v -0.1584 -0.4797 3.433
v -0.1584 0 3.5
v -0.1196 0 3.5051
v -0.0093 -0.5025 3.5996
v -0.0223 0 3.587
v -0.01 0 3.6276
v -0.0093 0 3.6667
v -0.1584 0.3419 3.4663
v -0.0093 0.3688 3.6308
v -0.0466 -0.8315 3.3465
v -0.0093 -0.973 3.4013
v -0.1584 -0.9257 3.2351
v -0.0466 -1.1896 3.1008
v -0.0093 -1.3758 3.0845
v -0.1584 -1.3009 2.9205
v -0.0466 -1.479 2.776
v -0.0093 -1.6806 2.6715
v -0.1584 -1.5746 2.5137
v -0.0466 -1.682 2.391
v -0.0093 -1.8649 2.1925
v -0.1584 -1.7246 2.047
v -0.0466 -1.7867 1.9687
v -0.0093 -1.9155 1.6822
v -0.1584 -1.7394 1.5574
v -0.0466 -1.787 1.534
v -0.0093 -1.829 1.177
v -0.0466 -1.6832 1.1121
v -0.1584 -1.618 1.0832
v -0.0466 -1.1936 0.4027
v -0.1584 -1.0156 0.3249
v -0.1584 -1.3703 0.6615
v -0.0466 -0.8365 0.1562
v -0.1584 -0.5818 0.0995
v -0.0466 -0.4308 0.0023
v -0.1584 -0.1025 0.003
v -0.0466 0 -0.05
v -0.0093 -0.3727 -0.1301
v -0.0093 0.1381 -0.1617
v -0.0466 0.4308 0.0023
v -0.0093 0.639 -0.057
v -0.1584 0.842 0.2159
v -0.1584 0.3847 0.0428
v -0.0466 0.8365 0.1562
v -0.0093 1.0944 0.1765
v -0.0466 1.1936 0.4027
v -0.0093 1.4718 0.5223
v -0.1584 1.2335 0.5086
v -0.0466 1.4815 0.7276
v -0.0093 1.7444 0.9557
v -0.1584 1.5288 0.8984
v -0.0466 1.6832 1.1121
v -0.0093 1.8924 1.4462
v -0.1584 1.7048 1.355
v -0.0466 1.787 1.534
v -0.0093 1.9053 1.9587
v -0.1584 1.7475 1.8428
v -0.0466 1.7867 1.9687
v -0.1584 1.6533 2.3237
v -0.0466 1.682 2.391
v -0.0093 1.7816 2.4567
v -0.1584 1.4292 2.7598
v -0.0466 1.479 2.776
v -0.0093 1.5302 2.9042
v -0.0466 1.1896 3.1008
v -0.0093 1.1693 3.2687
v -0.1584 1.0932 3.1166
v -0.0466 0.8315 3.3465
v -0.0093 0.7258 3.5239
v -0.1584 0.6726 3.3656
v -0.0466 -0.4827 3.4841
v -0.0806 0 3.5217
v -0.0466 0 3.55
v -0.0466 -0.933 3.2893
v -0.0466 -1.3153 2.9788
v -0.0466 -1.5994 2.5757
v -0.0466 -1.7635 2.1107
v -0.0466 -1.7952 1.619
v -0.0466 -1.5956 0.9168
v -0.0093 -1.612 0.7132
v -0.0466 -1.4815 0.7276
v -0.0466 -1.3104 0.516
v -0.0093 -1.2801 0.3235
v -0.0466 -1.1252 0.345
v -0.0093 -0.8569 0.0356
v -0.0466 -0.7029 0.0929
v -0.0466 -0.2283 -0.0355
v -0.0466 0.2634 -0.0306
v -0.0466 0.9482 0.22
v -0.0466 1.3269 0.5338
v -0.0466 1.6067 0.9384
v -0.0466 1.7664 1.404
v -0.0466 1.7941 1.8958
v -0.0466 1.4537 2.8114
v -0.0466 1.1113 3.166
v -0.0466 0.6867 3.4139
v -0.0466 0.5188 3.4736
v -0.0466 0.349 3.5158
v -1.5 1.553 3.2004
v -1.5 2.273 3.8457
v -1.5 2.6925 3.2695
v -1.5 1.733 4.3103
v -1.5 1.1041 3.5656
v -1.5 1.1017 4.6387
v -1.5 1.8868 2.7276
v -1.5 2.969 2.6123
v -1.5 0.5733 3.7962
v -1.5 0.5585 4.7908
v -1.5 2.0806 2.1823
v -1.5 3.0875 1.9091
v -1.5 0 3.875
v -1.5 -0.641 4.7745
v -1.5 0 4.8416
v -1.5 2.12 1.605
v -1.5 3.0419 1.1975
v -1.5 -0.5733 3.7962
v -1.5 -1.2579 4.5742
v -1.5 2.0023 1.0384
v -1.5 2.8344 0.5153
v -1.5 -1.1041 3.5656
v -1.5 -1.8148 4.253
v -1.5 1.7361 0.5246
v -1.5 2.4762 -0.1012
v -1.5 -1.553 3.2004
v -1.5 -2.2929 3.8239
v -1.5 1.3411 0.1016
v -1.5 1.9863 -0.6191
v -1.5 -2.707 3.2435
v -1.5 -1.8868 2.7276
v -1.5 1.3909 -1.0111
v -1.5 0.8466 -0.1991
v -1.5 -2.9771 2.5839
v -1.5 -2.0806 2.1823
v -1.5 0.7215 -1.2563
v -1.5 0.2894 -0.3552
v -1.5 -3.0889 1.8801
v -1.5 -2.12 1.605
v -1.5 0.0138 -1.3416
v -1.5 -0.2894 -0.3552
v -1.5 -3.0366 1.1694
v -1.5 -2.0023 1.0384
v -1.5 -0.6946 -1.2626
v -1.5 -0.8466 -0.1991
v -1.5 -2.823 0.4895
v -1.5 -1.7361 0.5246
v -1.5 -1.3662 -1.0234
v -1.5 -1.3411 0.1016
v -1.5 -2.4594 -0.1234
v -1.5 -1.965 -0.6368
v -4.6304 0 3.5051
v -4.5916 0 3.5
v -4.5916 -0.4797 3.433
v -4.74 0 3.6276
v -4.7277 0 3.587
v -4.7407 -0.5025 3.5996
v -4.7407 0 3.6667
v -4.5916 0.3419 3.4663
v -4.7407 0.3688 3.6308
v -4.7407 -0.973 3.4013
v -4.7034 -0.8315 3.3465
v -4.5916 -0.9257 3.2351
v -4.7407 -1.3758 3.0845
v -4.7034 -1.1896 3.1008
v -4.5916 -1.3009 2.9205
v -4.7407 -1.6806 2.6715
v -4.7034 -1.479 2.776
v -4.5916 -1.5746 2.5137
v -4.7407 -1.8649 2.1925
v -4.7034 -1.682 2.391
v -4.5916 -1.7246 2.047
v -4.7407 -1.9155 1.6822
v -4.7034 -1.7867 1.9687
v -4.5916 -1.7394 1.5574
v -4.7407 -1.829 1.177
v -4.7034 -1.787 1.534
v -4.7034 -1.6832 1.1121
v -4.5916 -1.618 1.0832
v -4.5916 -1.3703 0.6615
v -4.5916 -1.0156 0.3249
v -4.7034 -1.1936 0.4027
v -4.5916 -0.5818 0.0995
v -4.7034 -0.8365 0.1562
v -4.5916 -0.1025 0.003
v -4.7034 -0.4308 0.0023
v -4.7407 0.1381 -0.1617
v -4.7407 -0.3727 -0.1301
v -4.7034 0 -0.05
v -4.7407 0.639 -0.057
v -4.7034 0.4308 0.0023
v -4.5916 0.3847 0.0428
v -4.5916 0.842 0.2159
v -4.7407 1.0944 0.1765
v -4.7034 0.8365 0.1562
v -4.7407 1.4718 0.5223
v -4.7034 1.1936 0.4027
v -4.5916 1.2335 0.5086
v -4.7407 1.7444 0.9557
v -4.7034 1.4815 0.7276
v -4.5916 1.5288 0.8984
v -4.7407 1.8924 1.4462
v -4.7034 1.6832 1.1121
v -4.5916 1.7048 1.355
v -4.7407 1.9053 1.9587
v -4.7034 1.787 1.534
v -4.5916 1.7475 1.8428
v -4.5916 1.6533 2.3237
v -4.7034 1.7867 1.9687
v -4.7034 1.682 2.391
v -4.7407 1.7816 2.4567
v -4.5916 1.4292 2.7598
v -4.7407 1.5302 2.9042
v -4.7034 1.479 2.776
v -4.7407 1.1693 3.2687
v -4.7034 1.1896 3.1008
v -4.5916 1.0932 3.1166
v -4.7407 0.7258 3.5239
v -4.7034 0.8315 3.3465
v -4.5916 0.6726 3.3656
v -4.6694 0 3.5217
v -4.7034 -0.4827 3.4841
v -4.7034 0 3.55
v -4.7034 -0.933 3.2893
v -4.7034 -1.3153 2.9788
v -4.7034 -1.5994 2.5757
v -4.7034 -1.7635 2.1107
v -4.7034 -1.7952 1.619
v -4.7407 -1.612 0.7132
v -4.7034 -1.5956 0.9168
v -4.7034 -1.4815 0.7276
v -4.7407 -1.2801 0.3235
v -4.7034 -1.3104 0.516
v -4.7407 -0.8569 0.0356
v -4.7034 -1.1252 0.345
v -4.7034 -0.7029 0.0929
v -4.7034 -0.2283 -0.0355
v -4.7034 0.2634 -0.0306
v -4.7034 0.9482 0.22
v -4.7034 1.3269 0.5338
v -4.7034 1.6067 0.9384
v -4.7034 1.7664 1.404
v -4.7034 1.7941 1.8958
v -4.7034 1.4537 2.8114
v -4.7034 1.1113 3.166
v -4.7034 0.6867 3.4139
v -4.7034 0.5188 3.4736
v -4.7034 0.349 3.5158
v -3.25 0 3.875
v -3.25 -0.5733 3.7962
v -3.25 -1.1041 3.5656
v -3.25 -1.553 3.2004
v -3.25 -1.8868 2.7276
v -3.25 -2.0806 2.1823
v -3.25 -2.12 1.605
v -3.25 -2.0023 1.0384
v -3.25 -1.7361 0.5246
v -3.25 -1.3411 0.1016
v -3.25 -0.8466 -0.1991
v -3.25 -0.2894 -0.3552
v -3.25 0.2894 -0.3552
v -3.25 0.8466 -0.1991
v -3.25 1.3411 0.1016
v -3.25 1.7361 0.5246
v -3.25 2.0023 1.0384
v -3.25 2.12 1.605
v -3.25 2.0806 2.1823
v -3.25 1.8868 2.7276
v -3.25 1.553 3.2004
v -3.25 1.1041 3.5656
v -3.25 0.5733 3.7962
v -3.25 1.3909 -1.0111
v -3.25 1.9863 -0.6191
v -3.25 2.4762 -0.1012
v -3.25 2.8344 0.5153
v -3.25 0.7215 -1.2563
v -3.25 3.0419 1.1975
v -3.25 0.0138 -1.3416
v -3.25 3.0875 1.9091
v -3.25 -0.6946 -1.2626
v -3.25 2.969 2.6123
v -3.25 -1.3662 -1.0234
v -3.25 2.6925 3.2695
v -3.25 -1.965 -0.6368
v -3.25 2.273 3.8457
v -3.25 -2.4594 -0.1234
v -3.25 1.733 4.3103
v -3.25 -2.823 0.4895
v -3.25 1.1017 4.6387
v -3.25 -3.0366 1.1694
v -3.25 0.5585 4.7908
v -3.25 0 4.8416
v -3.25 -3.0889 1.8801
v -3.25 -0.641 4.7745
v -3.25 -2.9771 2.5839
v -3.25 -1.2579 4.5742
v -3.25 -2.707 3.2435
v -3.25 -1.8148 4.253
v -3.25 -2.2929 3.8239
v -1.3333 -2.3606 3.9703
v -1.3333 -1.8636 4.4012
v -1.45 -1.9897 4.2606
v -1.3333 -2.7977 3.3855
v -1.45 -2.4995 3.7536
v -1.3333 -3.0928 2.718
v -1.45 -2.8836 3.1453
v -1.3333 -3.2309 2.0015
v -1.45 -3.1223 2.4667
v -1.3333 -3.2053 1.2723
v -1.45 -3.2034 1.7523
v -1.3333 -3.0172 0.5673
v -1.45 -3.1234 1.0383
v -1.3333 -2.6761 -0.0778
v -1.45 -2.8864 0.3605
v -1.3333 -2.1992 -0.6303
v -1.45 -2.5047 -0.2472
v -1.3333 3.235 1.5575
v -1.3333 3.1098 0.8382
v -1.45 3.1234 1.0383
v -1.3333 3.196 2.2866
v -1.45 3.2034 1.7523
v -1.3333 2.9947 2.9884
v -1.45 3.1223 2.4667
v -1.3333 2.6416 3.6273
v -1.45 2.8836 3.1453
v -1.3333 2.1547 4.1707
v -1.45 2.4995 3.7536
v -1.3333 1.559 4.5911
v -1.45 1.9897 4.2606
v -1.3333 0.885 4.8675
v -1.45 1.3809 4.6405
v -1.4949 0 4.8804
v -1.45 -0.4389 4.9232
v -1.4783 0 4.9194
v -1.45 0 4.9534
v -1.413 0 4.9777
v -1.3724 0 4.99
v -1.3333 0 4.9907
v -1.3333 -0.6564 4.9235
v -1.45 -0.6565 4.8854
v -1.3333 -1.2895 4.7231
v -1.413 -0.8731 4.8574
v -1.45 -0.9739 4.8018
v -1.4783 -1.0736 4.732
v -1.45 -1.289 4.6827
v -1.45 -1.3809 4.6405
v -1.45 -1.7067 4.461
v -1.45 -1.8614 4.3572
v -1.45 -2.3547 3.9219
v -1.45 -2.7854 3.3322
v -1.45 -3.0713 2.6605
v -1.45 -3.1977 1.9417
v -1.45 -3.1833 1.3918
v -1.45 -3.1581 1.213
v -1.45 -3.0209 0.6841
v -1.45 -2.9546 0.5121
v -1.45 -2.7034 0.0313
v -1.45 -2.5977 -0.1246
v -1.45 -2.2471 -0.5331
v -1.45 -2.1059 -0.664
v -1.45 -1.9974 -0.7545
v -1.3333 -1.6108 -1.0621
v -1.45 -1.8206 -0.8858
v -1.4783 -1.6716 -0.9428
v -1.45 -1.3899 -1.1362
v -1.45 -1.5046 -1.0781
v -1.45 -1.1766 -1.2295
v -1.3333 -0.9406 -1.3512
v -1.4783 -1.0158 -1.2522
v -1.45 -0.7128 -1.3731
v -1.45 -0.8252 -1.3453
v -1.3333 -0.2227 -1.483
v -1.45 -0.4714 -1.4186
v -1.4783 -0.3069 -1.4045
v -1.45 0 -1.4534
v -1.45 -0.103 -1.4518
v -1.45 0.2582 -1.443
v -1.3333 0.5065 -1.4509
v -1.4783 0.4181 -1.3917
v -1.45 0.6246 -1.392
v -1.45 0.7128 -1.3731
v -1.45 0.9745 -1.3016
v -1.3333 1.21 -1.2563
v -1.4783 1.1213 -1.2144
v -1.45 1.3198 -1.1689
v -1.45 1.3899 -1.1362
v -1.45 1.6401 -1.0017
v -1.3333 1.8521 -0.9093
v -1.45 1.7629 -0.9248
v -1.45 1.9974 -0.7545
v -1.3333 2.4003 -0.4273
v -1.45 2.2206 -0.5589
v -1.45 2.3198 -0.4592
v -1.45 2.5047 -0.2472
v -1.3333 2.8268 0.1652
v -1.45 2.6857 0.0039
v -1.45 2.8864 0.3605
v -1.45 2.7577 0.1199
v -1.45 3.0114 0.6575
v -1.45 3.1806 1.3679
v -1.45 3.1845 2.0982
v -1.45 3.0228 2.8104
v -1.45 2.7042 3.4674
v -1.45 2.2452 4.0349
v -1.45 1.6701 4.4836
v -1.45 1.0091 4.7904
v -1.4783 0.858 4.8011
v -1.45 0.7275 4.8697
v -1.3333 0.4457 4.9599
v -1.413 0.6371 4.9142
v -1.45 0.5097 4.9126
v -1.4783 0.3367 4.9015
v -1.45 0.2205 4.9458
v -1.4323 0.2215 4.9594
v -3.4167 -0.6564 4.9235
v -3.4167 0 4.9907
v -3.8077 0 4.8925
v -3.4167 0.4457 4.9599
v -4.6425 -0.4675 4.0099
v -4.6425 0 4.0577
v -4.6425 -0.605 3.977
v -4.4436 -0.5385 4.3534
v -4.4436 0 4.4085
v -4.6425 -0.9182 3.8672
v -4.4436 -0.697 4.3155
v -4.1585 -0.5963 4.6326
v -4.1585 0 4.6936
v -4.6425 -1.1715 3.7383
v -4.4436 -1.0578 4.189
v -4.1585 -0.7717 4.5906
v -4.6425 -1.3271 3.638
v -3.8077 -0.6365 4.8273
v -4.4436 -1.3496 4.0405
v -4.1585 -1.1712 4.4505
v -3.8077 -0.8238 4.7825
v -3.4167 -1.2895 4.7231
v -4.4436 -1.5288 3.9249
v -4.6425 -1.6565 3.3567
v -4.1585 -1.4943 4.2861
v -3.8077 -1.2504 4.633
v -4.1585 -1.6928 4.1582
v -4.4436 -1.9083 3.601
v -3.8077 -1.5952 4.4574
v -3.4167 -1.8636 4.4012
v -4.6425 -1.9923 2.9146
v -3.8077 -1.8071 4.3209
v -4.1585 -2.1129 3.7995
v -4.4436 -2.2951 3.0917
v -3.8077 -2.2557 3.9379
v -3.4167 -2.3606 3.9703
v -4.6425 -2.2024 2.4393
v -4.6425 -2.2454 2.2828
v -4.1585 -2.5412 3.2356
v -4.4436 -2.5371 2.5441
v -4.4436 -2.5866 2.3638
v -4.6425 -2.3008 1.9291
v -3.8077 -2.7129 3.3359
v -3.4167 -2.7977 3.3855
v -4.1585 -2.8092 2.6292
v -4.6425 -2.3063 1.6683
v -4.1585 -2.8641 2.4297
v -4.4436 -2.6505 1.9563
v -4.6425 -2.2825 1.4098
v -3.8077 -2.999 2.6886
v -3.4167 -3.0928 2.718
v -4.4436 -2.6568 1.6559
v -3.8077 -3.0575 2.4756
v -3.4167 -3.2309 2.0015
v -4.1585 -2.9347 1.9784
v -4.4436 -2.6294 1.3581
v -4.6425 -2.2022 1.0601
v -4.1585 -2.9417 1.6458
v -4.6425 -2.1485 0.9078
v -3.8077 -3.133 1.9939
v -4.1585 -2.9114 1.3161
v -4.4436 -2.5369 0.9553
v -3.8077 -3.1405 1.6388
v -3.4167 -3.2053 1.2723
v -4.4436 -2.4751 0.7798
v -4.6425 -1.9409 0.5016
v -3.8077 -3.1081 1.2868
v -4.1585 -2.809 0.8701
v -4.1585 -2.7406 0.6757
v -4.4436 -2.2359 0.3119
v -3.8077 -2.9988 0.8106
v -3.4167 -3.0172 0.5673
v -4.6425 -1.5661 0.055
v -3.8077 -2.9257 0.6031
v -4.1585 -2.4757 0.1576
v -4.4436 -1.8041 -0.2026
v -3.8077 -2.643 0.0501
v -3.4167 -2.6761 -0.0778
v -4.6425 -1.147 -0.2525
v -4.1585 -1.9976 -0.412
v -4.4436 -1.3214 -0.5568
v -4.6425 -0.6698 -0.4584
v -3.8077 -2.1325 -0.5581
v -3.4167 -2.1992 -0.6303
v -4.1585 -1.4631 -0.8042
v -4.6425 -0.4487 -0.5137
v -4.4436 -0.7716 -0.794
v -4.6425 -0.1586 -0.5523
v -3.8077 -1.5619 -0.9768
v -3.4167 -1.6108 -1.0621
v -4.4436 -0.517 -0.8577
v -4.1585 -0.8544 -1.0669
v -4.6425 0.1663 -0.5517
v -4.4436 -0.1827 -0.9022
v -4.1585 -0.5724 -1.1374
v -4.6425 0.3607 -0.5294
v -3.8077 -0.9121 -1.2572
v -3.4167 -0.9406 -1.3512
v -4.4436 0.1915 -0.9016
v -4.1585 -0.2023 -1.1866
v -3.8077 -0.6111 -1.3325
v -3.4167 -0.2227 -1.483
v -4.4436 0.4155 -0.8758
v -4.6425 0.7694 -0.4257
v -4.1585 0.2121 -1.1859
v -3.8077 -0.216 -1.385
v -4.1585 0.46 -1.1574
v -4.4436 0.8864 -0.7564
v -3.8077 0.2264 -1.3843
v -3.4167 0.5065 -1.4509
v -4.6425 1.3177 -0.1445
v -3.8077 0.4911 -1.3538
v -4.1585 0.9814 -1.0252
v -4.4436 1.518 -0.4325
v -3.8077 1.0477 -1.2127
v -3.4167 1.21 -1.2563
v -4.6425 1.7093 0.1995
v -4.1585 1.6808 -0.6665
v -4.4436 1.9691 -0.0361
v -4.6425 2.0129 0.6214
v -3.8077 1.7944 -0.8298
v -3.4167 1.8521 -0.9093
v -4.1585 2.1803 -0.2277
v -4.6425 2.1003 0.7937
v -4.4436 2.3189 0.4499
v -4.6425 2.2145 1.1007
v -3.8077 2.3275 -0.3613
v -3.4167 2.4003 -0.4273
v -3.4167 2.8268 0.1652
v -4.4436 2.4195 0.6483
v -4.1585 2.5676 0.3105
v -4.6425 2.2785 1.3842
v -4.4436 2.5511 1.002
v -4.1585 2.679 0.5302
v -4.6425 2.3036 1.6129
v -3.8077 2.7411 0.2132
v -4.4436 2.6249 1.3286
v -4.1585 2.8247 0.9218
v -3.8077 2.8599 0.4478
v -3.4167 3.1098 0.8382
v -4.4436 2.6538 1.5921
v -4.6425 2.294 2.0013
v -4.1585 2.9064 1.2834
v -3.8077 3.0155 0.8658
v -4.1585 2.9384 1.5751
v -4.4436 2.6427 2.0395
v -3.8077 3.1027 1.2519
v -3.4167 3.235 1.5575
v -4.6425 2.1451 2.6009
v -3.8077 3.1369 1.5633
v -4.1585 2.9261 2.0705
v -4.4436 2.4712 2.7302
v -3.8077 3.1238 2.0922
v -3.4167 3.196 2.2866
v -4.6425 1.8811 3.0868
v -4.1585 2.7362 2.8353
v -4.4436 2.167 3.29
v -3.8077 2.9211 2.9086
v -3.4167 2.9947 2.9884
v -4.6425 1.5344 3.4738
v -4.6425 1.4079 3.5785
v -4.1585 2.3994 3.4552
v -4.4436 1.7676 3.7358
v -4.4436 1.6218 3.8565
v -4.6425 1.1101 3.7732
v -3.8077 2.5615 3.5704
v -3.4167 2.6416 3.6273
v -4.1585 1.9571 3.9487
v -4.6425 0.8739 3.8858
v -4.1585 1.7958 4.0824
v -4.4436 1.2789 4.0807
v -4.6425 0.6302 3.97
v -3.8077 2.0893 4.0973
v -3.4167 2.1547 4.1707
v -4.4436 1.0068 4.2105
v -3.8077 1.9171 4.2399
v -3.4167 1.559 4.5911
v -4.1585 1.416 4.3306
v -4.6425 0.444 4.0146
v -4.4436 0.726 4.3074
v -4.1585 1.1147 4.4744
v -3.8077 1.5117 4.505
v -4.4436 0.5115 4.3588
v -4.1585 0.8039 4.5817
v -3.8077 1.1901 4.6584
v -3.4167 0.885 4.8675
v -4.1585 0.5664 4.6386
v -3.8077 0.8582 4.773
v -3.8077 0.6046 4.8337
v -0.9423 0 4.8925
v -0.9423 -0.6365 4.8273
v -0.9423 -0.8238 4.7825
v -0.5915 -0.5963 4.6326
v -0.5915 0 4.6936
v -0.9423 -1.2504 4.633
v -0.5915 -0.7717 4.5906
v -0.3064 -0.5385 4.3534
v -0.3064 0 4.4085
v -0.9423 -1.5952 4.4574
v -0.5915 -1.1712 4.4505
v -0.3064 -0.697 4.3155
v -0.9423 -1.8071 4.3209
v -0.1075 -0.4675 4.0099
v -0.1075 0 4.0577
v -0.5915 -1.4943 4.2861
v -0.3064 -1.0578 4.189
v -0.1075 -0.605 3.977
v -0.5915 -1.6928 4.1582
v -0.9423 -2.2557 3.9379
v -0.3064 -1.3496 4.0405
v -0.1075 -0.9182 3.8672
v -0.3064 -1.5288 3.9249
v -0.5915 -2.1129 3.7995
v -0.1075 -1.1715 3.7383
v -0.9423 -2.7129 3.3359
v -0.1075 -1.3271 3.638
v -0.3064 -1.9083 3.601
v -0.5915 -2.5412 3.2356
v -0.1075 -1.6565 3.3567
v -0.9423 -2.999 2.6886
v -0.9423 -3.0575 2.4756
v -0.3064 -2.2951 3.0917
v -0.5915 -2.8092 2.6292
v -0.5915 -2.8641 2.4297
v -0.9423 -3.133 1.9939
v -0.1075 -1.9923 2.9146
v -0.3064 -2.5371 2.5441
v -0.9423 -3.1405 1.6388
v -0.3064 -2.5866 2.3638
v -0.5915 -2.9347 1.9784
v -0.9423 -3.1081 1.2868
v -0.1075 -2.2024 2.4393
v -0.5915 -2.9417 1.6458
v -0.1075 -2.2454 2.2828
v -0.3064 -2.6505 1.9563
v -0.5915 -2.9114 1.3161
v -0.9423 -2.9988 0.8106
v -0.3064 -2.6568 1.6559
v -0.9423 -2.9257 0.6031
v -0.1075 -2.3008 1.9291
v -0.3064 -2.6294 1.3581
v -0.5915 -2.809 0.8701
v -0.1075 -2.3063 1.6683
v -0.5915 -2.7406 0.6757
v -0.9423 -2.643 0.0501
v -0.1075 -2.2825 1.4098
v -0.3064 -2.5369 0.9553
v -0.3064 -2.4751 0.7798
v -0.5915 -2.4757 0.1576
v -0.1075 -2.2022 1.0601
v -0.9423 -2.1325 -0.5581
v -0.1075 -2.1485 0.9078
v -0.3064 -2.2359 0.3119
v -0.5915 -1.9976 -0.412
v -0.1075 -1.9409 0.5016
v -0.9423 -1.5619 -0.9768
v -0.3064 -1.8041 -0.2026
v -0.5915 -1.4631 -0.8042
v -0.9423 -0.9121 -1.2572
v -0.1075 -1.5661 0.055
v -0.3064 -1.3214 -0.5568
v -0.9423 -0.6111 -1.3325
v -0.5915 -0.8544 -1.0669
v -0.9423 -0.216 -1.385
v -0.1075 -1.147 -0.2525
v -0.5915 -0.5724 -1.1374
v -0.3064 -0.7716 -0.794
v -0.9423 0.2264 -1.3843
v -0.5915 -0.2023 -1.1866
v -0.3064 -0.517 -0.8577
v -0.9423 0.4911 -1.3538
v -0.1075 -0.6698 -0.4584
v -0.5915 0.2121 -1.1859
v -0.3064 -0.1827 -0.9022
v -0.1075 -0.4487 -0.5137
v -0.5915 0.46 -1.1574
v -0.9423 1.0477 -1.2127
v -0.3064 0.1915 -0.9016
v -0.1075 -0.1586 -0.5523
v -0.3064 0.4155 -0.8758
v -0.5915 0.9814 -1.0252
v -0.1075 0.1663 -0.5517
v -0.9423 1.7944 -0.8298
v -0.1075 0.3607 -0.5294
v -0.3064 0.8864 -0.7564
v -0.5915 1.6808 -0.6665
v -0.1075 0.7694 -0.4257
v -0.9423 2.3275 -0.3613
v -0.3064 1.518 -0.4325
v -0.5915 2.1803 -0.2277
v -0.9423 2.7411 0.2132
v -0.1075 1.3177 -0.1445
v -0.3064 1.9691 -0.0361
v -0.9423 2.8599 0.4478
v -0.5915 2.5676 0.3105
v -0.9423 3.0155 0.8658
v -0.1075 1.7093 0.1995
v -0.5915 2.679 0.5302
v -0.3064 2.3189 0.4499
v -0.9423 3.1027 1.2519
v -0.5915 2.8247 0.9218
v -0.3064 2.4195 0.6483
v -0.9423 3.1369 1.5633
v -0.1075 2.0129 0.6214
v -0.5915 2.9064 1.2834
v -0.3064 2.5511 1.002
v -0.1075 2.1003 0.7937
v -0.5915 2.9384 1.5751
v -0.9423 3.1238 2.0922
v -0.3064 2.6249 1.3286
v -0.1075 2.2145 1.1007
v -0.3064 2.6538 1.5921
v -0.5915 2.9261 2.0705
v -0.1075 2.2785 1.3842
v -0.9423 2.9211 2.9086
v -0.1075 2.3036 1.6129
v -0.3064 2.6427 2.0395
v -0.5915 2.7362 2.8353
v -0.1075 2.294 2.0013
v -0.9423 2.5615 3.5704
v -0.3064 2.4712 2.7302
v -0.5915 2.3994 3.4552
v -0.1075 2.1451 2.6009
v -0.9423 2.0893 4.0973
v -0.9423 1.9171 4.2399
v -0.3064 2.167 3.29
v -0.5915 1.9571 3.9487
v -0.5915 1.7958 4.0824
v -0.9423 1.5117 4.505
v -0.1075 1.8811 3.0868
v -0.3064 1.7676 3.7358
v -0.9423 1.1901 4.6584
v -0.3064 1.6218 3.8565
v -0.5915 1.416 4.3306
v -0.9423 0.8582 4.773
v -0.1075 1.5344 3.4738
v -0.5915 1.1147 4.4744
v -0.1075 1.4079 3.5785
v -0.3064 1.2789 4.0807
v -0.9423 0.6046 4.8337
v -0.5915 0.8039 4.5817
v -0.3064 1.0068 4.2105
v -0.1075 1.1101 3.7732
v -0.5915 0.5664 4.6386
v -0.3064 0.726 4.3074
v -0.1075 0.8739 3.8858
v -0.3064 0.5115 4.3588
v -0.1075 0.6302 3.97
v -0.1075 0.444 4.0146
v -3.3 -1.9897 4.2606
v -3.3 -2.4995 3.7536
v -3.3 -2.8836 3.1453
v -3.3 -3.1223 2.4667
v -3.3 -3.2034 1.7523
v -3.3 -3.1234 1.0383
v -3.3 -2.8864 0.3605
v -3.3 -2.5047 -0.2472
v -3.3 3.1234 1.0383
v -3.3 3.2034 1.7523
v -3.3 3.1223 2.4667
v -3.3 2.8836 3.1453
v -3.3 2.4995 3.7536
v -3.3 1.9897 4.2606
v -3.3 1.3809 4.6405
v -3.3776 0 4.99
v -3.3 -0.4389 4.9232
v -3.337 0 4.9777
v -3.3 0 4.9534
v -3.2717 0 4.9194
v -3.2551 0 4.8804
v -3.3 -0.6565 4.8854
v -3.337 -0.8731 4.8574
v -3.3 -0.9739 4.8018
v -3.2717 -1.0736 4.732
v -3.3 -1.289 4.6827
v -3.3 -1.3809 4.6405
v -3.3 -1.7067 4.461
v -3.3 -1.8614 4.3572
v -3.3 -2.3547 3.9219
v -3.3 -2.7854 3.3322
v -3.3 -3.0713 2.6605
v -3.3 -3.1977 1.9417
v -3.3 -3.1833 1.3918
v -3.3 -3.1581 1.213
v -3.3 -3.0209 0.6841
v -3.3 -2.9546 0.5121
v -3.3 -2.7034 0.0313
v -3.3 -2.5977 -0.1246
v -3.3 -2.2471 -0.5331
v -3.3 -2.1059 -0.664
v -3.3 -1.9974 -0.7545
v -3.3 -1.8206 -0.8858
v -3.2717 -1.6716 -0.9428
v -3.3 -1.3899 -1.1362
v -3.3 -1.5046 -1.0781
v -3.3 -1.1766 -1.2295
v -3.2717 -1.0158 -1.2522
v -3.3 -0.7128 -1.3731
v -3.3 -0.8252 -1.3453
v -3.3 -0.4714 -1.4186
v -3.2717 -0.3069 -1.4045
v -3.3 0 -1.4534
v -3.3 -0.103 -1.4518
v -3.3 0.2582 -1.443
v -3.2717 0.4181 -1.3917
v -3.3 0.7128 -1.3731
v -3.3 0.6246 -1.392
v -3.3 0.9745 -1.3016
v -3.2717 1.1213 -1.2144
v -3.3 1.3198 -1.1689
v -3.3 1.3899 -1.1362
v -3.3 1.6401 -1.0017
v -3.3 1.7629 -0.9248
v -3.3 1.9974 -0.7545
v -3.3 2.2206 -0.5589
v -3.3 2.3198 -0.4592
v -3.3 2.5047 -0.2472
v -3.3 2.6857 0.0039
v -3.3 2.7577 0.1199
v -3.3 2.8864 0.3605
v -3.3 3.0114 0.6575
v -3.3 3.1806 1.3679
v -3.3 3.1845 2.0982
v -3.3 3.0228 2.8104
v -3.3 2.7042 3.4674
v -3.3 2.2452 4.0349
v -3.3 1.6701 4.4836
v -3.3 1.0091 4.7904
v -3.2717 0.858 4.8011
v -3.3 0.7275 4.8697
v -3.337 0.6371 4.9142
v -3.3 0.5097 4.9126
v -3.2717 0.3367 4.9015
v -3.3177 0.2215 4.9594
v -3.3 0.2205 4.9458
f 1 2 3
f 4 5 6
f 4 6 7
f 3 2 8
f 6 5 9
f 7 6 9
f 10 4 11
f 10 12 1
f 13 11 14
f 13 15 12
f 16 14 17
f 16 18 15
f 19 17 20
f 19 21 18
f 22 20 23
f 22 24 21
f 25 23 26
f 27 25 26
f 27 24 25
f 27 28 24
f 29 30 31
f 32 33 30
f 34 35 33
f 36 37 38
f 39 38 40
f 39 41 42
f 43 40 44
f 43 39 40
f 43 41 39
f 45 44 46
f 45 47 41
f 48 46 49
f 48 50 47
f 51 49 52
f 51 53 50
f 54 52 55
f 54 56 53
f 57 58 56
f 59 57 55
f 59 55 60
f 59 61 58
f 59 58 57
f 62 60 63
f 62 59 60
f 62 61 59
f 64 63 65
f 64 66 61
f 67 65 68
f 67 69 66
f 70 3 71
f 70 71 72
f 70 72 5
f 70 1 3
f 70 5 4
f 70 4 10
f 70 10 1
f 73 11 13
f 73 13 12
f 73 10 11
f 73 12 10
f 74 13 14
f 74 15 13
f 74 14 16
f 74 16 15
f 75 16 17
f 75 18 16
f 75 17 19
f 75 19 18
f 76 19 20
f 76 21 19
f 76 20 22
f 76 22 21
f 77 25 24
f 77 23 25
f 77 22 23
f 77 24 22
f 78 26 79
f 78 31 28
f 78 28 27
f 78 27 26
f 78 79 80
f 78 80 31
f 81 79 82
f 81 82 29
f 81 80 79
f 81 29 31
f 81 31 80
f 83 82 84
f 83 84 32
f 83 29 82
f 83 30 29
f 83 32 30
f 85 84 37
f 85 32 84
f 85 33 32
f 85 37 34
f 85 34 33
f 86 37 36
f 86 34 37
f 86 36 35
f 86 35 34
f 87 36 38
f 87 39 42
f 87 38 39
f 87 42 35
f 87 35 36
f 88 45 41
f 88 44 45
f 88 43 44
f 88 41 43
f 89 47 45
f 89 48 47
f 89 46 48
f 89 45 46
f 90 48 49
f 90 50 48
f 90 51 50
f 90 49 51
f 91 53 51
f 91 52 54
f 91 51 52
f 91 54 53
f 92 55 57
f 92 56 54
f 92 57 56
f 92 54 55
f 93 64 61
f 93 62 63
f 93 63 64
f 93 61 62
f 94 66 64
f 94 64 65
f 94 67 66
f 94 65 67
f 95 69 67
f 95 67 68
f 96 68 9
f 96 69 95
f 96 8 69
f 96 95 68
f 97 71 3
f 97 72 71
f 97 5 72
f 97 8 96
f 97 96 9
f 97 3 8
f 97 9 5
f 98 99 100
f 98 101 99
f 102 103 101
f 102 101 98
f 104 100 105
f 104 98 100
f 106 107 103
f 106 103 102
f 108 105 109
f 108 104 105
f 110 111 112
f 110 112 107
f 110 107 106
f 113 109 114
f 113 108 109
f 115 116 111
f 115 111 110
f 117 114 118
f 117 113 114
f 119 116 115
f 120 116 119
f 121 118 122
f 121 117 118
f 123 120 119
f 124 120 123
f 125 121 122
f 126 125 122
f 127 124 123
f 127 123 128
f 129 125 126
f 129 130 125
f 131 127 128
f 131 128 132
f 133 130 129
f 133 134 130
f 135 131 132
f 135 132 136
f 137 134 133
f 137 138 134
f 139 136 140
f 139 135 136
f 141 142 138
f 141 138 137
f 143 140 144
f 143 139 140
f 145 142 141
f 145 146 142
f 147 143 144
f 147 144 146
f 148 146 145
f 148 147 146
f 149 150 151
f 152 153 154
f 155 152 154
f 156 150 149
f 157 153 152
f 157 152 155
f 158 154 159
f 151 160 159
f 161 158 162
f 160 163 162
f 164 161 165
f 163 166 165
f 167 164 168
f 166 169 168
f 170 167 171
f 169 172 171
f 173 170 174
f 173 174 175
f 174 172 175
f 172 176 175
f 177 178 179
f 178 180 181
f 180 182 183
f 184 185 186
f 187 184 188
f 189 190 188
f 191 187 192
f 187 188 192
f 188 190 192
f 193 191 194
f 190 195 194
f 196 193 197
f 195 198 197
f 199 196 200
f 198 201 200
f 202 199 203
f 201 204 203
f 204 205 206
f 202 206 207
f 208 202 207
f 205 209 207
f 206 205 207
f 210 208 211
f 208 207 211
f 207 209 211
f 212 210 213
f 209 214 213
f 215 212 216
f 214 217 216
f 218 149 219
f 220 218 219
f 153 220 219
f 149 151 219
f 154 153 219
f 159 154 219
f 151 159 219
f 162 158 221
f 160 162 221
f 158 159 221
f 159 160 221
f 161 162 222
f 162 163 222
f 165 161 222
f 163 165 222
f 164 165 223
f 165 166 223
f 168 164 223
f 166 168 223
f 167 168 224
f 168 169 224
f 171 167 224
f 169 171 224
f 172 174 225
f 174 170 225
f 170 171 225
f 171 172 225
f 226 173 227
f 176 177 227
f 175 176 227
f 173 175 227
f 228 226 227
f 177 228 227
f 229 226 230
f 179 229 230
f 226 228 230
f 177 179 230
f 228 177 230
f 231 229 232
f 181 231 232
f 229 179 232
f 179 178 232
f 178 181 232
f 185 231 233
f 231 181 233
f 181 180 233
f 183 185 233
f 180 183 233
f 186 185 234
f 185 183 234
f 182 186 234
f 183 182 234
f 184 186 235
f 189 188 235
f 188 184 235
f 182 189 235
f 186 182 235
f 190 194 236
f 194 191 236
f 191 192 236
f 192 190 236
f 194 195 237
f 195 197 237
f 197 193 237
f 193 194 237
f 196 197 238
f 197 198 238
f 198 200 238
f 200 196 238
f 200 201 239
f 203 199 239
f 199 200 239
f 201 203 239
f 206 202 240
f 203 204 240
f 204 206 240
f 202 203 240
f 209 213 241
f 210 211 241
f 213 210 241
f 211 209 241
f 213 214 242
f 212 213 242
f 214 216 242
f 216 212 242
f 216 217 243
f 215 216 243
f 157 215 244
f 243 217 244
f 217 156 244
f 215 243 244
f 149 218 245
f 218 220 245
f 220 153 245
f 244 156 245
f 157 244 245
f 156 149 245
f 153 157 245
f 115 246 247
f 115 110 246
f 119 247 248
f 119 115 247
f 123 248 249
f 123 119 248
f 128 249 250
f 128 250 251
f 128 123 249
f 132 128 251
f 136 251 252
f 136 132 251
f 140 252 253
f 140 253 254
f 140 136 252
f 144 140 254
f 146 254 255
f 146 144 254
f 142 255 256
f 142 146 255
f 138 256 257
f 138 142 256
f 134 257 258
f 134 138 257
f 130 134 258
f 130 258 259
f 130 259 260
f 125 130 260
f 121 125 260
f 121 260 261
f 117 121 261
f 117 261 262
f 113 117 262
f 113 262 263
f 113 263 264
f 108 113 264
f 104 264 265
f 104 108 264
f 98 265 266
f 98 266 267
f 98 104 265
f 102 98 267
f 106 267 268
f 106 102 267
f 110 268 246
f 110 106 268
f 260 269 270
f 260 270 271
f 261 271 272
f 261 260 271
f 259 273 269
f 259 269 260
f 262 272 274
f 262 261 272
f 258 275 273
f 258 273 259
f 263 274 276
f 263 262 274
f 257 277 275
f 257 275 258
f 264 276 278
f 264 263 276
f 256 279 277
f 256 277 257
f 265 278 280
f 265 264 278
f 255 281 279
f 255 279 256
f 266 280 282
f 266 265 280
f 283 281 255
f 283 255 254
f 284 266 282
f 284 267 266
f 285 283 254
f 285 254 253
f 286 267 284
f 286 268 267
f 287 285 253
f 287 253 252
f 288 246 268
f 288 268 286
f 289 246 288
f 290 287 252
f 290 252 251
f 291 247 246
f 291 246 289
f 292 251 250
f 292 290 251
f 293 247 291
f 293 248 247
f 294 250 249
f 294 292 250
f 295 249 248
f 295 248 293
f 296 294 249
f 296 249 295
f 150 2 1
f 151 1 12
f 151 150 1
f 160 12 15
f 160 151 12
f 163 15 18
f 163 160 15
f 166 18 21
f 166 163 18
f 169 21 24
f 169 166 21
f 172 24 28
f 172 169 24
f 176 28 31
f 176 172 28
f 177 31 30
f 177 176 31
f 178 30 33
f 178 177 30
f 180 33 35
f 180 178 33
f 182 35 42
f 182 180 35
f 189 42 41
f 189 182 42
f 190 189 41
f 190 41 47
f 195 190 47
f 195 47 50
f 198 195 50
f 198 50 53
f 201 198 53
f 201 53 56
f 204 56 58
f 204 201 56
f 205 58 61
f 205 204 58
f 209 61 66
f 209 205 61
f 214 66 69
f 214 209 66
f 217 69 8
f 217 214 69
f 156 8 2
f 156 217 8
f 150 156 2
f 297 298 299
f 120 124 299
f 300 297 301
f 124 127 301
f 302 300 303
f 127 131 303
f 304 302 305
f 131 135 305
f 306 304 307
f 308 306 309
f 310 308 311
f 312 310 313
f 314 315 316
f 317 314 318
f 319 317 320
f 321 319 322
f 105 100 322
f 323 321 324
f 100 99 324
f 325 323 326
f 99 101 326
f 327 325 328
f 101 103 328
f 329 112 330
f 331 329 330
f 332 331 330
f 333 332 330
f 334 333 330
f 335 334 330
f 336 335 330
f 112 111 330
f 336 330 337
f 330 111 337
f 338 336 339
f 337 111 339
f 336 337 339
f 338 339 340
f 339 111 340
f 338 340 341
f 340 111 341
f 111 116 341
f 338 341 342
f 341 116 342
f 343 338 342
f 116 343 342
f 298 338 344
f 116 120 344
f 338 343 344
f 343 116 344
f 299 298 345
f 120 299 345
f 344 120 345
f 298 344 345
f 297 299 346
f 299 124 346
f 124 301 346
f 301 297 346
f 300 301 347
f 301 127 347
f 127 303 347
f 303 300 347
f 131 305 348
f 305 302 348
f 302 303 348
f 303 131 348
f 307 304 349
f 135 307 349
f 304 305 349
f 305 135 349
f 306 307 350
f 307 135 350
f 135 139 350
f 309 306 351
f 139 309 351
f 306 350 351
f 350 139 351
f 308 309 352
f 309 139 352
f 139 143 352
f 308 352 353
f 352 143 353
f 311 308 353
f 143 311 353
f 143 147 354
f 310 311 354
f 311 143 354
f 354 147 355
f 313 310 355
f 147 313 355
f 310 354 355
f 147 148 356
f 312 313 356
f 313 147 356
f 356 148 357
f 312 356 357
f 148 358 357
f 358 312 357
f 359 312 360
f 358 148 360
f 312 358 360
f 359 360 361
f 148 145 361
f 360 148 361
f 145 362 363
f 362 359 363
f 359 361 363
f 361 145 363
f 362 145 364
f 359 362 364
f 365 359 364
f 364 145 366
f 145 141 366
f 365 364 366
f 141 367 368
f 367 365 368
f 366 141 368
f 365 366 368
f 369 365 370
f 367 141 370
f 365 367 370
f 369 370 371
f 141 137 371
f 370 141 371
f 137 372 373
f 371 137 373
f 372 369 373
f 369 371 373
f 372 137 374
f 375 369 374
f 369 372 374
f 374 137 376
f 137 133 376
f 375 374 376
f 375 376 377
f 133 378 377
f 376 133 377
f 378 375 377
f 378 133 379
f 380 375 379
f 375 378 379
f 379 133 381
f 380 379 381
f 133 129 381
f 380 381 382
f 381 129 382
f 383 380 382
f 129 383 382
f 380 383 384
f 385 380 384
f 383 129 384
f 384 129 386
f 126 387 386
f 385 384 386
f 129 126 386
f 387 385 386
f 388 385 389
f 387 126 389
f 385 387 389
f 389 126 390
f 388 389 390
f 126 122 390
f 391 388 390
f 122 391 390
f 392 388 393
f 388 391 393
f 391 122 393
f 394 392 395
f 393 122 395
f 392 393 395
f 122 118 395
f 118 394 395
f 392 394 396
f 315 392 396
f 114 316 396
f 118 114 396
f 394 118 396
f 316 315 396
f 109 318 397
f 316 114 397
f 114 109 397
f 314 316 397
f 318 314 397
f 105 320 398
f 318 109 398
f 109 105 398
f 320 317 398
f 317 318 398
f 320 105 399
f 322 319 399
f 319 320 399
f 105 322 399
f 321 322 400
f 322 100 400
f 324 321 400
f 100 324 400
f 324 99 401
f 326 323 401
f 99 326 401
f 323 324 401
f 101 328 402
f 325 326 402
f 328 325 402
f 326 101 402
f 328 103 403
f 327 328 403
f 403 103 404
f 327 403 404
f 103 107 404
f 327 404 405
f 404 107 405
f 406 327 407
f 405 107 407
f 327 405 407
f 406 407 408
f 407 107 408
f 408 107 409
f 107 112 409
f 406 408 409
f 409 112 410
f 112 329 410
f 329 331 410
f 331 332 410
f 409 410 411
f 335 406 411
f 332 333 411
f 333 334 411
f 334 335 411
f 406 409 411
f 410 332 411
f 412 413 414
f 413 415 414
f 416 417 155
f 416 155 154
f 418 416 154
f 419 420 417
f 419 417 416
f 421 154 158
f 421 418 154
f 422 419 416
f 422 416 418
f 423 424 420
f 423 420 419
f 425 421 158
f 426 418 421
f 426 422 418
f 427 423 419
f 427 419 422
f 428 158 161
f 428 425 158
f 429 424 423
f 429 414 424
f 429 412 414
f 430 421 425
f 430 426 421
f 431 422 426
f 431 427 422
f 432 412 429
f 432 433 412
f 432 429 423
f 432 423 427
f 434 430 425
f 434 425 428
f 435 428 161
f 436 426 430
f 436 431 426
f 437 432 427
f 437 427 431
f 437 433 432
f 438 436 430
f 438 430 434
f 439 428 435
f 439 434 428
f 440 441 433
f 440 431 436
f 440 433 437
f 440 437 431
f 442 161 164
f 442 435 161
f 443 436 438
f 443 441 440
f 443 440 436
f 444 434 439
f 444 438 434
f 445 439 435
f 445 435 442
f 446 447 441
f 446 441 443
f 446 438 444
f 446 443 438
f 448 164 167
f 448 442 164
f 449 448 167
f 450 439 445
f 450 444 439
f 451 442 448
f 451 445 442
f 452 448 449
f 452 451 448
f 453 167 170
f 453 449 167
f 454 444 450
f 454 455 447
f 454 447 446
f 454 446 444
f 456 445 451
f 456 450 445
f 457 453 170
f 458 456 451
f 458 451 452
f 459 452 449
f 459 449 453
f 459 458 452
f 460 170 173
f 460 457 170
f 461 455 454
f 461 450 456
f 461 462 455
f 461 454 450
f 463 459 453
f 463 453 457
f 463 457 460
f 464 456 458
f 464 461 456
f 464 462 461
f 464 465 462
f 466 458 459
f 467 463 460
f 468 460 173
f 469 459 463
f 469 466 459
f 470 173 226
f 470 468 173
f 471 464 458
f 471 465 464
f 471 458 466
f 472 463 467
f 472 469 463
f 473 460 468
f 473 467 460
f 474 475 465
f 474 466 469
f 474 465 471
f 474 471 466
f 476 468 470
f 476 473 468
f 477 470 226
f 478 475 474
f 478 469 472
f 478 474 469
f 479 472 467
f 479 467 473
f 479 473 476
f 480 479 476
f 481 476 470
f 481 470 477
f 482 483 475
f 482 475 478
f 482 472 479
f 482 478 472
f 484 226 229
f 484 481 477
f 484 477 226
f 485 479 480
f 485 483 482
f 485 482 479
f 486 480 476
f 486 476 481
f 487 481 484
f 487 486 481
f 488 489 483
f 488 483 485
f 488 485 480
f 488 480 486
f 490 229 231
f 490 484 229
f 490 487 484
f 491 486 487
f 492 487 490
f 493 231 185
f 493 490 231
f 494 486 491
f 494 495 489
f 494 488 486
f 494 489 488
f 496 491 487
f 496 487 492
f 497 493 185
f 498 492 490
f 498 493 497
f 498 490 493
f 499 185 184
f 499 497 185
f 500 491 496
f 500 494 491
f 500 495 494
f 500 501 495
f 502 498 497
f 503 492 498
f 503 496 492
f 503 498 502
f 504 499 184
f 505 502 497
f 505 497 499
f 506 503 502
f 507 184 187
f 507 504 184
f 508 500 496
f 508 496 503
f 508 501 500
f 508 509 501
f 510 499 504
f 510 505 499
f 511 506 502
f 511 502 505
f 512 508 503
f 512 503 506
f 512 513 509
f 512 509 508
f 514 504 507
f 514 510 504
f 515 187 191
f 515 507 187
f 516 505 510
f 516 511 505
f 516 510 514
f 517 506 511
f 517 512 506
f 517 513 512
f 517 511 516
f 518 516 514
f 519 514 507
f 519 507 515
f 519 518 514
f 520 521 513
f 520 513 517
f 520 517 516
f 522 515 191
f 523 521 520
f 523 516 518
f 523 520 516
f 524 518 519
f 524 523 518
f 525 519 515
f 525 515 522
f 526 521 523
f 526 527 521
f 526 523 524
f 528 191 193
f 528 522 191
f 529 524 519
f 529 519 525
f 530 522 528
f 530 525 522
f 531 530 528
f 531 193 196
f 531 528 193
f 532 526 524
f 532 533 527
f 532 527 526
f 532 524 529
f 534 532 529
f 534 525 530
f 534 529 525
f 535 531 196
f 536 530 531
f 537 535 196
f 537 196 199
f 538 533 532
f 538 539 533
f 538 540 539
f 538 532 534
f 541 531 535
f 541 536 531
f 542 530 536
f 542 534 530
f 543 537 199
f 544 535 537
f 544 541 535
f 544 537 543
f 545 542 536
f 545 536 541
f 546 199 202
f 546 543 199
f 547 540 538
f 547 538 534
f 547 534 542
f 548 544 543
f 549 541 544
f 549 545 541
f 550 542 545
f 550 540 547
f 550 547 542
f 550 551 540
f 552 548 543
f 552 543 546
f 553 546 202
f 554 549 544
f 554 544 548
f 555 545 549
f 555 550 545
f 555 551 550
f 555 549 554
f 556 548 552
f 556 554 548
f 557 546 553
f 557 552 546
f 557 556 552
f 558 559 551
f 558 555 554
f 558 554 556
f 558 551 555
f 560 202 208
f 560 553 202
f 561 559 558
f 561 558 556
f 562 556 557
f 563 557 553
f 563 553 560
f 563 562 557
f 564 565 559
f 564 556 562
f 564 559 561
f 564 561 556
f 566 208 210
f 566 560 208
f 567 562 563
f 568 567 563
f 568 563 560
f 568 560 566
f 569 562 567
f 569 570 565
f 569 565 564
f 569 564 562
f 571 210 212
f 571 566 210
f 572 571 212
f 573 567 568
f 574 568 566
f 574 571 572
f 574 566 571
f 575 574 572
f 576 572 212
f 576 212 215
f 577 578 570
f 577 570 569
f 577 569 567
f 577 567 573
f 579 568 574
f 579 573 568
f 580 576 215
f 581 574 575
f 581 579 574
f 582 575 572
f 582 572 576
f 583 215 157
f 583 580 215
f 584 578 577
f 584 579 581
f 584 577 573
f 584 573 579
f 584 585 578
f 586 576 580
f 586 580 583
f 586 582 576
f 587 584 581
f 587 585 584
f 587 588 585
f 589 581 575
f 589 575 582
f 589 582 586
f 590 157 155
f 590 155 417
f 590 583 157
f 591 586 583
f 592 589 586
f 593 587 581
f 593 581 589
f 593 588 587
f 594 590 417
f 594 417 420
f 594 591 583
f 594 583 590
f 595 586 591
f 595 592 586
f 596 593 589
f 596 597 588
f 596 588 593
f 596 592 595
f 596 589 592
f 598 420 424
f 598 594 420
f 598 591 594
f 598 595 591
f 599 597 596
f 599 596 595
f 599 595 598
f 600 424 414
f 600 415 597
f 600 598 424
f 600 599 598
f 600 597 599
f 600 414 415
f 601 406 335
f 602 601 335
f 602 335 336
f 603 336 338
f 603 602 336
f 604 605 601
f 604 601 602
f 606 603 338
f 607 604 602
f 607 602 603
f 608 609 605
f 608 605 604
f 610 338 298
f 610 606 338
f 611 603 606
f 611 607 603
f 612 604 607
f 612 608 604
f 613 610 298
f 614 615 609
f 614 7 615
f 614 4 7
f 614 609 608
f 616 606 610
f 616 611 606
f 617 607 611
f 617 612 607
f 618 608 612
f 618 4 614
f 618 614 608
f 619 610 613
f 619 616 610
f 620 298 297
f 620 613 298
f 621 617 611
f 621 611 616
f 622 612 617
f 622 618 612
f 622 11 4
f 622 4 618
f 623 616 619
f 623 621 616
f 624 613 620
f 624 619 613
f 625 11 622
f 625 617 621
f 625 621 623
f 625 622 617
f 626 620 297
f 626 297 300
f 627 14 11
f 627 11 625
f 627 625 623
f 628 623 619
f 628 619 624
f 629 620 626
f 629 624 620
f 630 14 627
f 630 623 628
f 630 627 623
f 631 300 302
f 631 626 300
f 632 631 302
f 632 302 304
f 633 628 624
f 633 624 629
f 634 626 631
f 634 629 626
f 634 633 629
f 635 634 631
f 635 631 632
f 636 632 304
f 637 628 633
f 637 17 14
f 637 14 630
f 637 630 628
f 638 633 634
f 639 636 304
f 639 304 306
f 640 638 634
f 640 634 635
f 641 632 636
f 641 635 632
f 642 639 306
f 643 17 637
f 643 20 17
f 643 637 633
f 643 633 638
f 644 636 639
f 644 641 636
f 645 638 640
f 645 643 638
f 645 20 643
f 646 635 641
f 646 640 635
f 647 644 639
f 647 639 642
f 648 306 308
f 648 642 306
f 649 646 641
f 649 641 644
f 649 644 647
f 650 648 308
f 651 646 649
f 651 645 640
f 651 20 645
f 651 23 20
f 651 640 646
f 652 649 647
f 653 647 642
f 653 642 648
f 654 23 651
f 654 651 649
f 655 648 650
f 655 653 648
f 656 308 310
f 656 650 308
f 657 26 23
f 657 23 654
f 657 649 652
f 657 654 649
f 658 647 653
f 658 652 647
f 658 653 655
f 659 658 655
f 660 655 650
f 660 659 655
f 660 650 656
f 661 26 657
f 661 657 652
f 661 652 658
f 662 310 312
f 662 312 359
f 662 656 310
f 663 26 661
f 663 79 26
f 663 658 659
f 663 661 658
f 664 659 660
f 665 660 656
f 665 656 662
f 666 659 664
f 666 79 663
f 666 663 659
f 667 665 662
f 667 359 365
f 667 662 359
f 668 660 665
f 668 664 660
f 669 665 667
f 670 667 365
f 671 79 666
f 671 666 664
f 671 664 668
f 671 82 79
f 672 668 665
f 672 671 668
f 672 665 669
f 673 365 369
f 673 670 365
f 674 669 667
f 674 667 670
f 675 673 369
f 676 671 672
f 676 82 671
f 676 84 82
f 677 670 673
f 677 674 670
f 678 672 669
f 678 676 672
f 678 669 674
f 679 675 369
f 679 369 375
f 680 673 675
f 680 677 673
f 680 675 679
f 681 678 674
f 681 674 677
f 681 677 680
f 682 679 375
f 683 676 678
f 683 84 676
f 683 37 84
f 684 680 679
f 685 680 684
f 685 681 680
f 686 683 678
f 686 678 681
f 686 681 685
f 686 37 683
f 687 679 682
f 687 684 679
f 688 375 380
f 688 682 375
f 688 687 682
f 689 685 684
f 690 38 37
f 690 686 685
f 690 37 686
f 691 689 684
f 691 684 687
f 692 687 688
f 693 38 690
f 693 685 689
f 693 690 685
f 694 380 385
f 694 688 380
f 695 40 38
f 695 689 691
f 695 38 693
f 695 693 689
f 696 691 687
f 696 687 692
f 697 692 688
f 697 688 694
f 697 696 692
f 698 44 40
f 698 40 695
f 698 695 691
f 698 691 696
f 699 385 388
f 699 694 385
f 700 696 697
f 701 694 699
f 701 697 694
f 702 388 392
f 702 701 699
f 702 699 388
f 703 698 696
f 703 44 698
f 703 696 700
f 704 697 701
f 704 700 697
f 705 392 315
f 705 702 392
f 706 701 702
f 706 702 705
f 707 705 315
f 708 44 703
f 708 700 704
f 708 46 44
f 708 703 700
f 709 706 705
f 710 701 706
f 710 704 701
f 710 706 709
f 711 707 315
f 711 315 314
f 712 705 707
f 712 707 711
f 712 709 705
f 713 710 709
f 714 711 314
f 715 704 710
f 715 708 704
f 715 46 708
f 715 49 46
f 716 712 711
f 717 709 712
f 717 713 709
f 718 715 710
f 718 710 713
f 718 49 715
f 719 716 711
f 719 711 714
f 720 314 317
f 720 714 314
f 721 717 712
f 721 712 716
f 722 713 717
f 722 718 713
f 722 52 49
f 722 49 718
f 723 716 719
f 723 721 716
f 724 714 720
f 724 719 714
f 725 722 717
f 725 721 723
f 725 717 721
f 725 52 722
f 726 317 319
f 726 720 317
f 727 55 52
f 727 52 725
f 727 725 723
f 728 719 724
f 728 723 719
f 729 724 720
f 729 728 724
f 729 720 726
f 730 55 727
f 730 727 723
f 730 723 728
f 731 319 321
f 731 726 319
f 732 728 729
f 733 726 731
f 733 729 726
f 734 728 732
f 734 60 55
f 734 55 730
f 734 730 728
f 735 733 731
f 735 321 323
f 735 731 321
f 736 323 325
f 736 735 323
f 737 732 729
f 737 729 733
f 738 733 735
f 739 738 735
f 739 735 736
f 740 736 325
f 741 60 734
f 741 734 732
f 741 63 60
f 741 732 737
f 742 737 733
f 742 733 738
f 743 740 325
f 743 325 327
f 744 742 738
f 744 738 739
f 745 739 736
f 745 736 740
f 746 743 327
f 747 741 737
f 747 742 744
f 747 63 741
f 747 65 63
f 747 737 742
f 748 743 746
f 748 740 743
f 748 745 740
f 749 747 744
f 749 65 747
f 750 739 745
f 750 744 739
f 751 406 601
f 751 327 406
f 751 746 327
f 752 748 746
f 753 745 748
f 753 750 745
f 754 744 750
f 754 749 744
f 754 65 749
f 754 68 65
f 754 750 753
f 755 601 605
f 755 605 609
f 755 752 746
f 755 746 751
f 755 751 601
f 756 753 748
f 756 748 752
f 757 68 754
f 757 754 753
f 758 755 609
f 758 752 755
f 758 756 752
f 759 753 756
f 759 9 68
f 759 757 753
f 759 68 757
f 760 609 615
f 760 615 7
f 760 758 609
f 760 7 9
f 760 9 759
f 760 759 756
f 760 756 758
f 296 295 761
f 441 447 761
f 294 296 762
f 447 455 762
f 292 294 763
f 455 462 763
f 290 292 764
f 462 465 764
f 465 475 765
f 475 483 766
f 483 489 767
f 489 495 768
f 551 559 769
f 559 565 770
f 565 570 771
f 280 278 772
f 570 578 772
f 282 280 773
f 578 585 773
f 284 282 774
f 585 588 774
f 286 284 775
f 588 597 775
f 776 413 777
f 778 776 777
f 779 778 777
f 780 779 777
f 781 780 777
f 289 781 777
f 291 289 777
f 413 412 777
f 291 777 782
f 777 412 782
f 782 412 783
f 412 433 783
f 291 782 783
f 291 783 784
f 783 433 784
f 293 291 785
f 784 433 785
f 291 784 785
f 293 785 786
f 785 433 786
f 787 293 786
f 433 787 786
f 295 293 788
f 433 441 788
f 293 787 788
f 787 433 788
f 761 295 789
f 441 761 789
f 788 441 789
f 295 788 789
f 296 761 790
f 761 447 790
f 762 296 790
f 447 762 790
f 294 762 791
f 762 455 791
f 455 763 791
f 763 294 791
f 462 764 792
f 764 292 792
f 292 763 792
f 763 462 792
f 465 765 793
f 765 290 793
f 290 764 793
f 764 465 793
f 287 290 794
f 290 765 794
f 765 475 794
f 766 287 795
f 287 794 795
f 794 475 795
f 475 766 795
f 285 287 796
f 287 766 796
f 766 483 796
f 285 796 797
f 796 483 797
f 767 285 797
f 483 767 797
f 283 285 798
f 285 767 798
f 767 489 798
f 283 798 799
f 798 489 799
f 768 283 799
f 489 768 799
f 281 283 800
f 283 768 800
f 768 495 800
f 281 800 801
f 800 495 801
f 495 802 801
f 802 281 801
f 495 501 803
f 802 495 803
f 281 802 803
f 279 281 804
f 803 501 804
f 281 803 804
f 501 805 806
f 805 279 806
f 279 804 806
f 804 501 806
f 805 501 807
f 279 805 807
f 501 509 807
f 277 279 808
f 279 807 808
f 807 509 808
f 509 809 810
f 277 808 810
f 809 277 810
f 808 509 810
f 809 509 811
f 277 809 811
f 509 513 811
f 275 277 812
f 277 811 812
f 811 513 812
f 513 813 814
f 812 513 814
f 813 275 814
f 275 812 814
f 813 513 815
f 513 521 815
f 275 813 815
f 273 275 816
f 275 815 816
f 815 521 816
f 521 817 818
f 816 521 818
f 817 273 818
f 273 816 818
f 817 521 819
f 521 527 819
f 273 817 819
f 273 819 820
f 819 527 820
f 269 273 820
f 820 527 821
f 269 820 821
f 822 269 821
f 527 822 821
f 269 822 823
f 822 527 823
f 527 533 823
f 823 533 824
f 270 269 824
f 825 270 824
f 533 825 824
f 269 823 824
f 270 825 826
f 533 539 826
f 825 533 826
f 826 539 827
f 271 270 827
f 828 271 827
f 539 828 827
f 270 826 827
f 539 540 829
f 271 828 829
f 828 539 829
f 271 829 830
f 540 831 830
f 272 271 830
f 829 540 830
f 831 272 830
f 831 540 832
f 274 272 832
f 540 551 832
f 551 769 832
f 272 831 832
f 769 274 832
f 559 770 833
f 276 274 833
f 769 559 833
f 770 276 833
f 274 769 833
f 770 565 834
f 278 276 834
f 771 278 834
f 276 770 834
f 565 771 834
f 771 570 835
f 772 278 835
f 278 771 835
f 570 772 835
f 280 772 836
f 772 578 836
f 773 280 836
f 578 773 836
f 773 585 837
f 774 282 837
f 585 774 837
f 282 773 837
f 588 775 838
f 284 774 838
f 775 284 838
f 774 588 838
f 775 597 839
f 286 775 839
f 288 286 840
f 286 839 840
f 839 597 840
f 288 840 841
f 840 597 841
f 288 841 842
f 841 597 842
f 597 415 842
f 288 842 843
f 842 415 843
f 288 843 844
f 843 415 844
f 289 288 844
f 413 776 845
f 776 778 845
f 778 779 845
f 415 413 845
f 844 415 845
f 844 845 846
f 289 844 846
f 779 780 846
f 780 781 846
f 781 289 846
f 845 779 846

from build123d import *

# Parameters (mm, degrees)
FILLET1_R = 0.15


with BuildPart() as part:
    # Sketch2 → Revolve1 (revolve)
    with BuildSketch(Plane(origin=(0, 0, 0), x_dir=(1, 0, 0), z_dir=(0, 1, 0)), mode=Mode.PRIVATE) as revolve1_sk:
        with BuildLine():
            Line((0, 0), (-4.75, 0))
            ThreePointArc((-4.75, 0), (-4.310660172, 1.060660172), (-3.25, 1.5))
            Line((-3.25, 1.5), (-3.25, 0.375))
            Line((-3.25, 0.375), (-1.5, 0.375))
            Line((-1.5, 0.375), (-1.5, 1.5))
            ThreePointArc((-1.5, 1.5), (-0.439339828, 1.060660172), (0, 0))
        make_face()
    revolve(revolve1_sk.sketch.rotate(Axis((-6.635988873, 0, 1.75), (1, 0, 0)), 180), axis=Axis((-6.635988873, 0, 1.75), (1, 0, 0)))

    # Fillet1
    fillet1_edges = [part.edges().sort_by_distance(p)[0] for p in [
        (-4.75, 0, 0),
        (-3.25, 0, -1.5),
        (-1.5, 0, -1.5),
        (0, 0, 0),
    ]]
    fillet(fillet1_edges, radius=FILLET1_R)


solid = part.part
